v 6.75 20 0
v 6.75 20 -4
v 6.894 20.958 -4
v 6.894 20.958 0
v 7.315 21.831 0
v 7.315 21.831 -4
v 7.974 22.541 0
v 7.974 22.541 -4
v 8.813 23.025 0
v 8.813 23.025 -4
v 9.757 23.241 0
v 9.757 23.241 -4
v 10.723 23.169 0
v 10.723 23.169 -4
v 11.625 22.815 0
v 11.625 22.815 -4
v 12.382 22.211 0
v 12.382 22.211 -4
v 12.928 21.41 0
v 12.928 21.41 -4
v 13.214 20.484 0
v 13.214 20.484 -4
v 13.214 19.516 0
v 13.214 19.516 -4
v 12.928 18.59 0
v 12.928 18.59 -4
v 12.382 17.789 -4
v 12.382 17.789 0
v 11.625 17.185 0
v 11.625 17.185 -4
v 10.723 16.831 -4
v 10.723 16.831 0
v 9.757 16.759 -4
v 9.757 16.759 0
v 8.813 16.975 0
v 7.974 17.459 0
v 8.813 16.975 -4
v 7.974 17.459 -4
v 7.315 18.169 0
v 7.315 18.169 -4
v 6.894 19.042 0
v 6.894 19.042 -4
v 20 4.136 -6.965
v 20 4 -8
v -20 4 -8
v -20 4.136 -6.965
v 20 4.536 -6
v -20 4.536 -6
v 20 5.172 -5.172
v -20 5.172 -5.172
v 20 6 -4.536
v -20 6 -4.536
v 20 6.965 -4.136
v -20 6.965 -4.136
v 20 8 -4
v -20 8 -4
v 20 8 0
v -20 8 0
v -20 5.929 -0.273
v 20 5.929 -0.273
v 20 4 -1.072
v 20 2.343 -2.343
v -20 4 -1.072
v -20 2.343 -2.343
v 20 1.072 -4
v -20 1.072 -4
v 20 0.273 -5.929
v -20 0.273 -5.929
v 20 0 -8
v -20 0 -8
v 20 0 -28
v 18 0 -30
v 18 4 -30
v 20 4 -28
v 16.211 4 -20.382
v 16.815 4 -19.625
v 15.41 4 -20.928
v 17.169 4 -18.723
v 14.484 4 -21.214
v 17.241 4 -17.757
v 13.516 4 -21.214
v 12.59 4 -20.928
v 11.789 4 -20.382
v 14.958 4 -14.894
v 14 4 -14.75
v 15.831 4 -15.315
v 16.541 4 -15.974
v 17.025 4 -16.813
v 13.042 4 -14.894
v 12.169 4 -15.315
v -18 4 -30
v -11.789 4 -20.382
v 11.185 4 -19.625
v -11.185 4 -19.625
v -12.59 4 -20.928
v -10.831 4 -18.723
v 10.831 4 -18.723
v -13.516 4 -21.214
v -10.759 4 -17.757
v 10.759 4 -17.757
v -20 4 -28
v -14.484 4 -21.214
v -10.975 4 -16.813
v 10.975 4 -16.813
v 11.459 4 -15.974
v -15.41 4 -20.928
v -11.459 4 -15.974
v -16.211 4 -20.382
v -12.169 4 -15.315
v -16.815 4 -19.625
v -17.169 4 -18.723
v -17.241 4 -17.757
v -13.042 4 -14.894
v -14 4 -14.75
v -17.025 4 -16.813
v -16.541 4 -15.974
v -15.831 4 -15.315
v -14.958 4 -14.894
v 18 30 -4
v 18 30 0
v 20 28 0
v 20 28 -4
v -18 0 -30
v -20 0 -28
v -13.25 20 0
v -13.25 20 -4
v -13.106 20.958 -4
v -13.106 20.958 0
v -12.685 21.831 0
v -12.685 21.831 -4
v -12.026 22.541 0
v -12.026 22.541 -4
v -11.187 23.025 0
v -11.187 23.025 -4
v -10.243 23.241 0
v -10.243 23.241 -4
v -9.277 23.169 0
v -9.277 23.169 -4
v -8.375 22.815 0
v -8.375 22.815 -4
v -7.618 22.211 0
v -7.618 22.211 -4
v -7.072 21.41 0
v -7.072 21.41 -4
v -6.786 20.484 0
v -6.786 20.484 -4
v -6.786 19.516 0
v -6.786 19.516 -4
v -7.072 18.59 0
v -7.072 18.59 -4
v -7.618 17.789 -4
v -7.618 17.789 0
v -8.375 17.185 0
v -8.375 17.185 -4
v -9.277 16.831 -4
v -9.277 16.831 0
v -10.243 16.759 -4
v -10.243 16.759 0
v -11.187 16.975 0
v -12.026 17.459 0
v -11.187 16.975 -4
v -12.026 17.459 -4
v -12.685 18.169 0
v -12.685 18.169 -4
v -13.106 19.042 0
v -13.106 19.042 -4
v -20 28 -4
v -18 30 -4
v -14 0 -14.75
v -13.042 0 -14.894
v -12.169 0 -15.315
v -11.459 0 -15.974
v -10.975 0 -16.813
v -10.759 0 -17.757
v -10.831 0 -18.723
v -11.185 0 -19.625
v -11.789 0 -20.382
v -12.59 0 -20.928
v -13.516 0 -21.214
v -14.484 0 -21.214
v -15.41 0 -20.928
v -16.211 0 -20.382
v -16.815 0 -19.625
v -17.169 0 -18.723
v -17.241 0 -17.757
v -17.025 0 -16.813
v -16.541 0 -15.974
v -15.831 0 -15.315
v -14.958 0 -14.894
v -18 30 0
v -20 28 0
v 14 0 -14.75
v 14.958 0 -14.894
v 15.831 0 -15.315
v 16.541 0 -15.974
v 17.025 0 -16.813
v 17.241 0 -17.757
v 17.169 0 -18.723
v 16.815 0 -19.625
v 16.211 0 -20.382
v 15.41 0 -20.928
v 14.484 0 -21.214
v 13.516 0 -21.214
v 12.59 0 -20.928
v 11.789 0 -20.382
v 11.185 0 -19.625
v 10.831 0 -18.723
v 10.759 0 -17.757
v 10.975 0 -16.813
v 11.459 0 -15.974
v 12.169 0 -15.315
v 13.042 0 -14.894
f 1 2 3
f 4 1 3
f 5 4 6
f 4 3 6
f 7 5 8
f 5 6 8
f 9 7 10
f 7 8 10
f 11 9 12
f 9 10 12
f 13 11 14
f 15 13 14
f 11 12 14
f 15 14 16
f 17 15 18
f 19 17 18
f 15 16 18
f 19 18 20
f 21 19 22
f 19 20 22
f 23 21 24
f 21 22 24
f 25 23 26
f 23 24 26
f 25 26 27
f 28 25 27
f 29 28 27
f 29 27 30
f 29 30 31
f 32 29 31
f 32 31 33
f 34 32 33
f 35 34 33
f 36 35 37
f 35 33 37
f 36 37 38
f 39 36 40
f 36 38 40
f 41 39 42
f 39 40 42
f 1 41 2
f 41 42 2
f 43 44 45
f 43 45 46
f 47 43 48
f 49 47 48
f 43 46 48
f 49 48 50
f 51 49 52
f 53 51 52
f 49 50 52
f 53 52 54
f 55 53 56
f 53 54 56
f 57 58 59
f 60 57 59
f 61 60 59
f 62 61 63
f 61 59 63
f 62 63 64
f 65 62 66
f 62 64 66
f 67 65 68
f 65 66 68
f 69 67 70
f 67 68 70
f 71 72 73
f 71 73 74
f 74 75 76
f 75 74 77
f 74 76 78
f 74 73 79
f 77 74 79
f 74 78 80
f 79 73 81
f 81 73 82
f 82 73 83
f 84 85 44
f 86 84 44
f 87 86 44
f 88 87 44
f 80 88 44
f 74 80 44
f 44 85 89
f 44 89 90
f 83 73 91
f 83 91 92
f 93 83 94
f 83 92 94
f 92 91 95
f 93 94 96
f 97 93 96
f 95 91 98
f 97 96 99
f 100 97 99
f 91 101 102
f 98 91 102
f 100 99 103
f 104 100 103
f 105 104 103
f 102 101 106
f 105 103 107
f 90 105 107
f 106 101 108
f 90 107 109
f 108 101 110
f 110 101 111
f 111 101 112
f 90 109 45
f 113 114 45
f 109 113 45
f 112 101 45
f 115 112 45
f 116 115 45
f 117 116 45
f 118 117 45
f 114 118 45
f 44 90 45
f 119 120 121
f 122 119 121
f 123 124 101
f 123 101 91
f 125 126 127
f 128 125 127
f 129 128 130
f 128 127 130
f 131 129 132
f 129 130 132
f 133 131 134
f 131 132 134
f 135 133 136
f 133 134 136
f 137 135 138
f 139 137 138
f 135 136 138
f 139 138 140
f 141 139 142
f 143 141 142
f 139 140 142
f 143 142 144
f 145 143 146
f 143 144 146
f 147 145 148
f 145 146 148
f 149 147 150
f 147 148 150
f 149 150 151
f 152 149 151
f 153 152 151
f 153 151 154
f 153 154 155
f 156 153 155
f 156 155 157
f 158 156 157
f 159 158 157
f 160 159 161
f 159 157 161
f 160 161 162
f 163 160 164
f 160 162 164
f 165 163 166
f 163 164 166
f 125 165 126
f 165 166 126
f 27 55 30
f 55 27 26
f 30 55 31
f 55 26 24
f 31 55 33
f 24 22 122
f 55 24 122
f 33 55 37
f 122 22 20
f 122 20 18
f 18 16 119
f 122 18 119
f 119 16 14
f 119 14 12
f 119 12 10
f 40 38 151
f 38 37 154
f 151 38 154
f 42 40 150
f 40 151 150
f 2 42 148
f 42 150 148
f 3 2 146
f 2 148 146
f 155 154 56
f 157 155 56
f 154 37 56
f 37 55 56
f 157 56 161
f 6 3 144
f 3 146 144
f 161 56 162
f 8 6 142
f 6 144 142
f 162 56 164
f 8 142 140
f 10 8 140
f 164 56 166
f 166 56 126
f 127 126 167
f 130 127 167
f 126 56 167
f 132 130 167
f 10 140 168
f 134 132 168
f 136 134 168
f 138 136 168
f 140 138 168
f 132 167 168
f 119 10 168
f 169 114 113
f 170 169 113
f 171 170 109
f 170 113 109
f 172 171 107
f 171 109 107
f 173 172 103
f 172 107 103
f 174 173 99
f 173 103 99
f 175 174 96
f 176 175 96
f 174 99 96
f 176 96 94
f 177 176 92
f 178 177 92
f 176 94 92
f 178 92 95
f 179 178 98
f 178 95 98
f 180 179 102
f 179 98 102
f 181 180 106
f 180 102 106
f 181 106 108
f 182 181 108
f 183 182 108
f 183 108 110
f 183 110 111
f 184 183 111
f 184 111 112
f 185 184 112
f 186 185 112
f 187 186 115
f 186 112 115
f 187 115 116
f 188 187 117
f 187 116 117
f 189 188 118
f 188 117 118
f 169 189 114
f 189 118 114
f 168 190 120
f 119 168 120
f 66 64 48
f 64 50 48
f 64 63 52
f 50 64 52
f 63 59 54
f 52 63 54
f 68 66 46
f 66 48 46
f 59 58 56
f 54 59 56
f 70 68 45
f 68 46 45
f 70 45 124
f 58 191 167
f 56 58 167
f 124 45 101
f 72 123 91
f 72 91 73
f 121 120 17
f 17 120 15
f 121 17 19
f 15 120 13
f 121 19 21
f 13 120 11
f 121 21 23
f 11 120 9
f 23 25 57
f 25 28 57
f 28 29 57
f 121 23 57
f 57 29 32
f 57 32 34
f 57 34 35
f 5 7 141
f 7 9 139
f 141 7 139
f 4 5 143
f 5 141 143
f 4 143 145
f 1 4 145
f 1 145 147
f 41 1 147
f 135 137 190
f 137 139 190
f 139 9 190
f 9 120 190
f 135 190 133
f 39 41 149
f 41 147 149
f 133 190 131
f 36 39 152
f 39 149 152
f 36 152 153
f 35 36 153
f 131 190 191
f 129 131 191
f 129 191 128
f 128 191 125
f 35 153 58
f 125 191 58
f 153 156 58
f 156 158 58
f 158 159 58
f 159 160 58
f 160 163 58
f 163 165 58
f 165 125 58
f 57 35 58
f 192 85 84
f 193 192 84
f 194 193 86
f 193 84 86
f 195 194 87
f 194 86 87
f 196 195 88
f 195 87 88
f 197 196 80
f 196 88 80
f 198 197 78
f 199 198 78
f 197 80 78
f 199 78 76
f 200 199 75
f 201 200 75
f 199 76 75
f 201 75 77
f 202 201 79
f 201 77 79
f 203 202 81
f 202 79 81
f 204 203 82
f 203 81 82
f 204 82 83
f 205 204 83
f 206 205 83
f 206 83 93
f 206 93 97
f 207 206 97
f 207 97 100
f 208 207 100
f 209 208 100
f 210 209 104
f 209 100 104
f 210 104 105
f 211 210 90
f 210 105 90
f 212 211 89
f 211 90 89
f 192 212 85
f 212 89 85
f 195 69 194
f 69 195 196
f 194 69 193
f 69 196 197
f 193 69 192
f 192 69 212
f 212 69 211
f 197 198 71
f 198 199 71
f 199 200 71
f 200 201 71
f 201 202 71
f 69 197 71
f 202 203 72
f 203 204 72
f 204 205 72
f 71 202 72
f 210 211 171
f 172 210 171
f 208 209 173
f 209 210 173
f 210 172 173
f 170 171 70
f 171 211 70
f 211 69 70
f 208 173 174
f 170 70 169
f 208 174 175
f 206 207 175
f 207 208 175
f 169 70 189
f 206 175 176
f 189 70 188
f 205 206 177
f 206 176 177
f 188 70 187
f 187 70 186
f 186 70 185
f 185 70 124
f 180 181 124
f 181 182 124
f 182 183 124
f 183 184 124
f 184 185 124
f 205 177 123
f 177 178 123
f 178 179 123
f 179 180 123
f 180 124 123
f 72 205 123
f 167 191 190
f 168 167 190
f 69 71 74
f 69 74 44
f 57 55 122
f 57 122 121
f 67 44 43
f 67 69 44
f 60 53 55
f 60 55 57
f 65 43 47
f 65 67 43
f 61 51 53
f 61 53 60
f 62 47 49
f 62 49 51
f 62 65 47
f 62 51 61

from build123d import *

# Parameters (mm, degrees)
EXTRUDE_1_DEPTH      = 20
EXTRUDE_1_DEPTH_BACK = 20
CUT_EXTRUDE_1_DEPTH  = 4
CUT_EXTRUDE_2_DEPTH  = 4
SKETCH_4_W           = 3.25
SKETCH_4_H           = 9
SKETCH_5_W           = 3.25
SKETCH_5_H           = 9
SKETCH_6_W           = 3.25
SKETCH_6_H           = 9
SKETCH_7_W           = 3.25
SKETCH_7_H           = 9


with BuildPart() as part:
    # ｽｹｯﾁ1 → ﾎﾞｽ - 押し出し1 (new, two sides: drawn at the far end of the back side and taken through both)
    with BuildSketch(Plane(origin=(0, 0, 0), x_dir=(0, 0, -1), z_dir=(1, 0, 0)).offset(-EXTRUDE_1_DEPTH_BACK)):
        with BuildLine():
            Line((8, 0), (30, 0))
            Line((30, 0), (30, 4))
            Line((30, 4), (8, 4))
            ThreePointArc((8, 4), (5.171572875, 5.171572875), (4, 8))
            Line((4, 8), (4, 30))
            Line((4, 30), (0, 30))
            Line((0, 30), (0, 8))
            ThreePointArc((0, 8), (2.343145751, 2.343145751), (8, 0))
        make_face()
    extrude(amount=EXTRUDE_1_DEPTH + EXTRUDE_1_DEPTH_BACK)

    # ｽｹｯﾁ2 → ｶｯﾄ - 押し出し1 (cut)
    with BuildSketch(Plane.XY):
        Polygon((-22, 32), (-22, 27), (-20, 27), (-20, 28), (-18, 30), (18, 30), (20, 28), (20, 27), (22, 27), (22, 32), align=None)
    extrude(amount=-CUT_EXTRUDE_1_DEPTH, mode=Mode.SUBTRACT)

    # ｽｹｯﾁ3 → ｶｯﾄ - 押し出し2 (cut)
    with BuildSketch(Plane(origin=(0, 0, 0), x_dir=(1, 0, 0), z_dir=(0, 1, 0))):
        Polygon((-22, 32), (-22, 27), (-20, 27), (-20, 28), (-18, 30), (18, 30), (20, 28), (20, 27), (22, 27), (22, 32), align=None)
    extrude(amount=CUT_EXTRUDE_2_DEPTH, mode=Mode.SUBTRACT)

    # ｽｹｯﾁ4 → ｶｯﾄ - 回転1 (revolve, cut)
    with BuildSketch(Plane(origin=(0, 20, 0), x_dir=(1, 0, 0), z_dir=(0, 1, 0))):
        with Locations((11.625, 4.5)):
            Rectangle(SKETCH_4_W, SKETCH_4_H)
    revolve(axis=Axis((10, 20, 0), (0, 0, -1)), mode=Mode.SUBTRACT)

    # ｽｹｯﾁ5 → ｶｯﾄ - 回転2 (revolve, cut)
    with BuildSketch(Plane(origin=(0, 20, 0), x_dir=(1, 0, 0), z_dir=(0, 1, 0))):
        with Locations((-8.375, 4.5)):
            Rectangle(SKETCH_5_W, SKETCH_5_H)
    revolve(axis=Axis((-10, 20, 0), (0, 0, -1)), mode=Mode.SUBTRACT)

    # ｽｹｯﾁ6 → ｶｯﾄ - 回転3 (revolve, cut)
    with BuildSketch(Plane.XY.offset(-18)):
        with Locations((15.625, 4.5)):
            Rectangle(SKETCH_6_W, SKETCH_6_H)
    revolve(axis=Axis((14, 0, -18), (0, 1, 0)), mode=Mode.SUBTRACT)

    # ｽｹｯﾁ7 → ｶｯﾄ - 回転4 (revolve, cut)
    with BuildSketch(Plane.XY.offset(-18)):
        with Locations((-12.375, 4.5)):
            Rectangle(SKETCH_7_W, SKETCH_7_H)
    revolve(axis=Axis((-14, 0, -18), (0, 1, 0)), mode=Mode.SUBTRACT)


solid = part.part
